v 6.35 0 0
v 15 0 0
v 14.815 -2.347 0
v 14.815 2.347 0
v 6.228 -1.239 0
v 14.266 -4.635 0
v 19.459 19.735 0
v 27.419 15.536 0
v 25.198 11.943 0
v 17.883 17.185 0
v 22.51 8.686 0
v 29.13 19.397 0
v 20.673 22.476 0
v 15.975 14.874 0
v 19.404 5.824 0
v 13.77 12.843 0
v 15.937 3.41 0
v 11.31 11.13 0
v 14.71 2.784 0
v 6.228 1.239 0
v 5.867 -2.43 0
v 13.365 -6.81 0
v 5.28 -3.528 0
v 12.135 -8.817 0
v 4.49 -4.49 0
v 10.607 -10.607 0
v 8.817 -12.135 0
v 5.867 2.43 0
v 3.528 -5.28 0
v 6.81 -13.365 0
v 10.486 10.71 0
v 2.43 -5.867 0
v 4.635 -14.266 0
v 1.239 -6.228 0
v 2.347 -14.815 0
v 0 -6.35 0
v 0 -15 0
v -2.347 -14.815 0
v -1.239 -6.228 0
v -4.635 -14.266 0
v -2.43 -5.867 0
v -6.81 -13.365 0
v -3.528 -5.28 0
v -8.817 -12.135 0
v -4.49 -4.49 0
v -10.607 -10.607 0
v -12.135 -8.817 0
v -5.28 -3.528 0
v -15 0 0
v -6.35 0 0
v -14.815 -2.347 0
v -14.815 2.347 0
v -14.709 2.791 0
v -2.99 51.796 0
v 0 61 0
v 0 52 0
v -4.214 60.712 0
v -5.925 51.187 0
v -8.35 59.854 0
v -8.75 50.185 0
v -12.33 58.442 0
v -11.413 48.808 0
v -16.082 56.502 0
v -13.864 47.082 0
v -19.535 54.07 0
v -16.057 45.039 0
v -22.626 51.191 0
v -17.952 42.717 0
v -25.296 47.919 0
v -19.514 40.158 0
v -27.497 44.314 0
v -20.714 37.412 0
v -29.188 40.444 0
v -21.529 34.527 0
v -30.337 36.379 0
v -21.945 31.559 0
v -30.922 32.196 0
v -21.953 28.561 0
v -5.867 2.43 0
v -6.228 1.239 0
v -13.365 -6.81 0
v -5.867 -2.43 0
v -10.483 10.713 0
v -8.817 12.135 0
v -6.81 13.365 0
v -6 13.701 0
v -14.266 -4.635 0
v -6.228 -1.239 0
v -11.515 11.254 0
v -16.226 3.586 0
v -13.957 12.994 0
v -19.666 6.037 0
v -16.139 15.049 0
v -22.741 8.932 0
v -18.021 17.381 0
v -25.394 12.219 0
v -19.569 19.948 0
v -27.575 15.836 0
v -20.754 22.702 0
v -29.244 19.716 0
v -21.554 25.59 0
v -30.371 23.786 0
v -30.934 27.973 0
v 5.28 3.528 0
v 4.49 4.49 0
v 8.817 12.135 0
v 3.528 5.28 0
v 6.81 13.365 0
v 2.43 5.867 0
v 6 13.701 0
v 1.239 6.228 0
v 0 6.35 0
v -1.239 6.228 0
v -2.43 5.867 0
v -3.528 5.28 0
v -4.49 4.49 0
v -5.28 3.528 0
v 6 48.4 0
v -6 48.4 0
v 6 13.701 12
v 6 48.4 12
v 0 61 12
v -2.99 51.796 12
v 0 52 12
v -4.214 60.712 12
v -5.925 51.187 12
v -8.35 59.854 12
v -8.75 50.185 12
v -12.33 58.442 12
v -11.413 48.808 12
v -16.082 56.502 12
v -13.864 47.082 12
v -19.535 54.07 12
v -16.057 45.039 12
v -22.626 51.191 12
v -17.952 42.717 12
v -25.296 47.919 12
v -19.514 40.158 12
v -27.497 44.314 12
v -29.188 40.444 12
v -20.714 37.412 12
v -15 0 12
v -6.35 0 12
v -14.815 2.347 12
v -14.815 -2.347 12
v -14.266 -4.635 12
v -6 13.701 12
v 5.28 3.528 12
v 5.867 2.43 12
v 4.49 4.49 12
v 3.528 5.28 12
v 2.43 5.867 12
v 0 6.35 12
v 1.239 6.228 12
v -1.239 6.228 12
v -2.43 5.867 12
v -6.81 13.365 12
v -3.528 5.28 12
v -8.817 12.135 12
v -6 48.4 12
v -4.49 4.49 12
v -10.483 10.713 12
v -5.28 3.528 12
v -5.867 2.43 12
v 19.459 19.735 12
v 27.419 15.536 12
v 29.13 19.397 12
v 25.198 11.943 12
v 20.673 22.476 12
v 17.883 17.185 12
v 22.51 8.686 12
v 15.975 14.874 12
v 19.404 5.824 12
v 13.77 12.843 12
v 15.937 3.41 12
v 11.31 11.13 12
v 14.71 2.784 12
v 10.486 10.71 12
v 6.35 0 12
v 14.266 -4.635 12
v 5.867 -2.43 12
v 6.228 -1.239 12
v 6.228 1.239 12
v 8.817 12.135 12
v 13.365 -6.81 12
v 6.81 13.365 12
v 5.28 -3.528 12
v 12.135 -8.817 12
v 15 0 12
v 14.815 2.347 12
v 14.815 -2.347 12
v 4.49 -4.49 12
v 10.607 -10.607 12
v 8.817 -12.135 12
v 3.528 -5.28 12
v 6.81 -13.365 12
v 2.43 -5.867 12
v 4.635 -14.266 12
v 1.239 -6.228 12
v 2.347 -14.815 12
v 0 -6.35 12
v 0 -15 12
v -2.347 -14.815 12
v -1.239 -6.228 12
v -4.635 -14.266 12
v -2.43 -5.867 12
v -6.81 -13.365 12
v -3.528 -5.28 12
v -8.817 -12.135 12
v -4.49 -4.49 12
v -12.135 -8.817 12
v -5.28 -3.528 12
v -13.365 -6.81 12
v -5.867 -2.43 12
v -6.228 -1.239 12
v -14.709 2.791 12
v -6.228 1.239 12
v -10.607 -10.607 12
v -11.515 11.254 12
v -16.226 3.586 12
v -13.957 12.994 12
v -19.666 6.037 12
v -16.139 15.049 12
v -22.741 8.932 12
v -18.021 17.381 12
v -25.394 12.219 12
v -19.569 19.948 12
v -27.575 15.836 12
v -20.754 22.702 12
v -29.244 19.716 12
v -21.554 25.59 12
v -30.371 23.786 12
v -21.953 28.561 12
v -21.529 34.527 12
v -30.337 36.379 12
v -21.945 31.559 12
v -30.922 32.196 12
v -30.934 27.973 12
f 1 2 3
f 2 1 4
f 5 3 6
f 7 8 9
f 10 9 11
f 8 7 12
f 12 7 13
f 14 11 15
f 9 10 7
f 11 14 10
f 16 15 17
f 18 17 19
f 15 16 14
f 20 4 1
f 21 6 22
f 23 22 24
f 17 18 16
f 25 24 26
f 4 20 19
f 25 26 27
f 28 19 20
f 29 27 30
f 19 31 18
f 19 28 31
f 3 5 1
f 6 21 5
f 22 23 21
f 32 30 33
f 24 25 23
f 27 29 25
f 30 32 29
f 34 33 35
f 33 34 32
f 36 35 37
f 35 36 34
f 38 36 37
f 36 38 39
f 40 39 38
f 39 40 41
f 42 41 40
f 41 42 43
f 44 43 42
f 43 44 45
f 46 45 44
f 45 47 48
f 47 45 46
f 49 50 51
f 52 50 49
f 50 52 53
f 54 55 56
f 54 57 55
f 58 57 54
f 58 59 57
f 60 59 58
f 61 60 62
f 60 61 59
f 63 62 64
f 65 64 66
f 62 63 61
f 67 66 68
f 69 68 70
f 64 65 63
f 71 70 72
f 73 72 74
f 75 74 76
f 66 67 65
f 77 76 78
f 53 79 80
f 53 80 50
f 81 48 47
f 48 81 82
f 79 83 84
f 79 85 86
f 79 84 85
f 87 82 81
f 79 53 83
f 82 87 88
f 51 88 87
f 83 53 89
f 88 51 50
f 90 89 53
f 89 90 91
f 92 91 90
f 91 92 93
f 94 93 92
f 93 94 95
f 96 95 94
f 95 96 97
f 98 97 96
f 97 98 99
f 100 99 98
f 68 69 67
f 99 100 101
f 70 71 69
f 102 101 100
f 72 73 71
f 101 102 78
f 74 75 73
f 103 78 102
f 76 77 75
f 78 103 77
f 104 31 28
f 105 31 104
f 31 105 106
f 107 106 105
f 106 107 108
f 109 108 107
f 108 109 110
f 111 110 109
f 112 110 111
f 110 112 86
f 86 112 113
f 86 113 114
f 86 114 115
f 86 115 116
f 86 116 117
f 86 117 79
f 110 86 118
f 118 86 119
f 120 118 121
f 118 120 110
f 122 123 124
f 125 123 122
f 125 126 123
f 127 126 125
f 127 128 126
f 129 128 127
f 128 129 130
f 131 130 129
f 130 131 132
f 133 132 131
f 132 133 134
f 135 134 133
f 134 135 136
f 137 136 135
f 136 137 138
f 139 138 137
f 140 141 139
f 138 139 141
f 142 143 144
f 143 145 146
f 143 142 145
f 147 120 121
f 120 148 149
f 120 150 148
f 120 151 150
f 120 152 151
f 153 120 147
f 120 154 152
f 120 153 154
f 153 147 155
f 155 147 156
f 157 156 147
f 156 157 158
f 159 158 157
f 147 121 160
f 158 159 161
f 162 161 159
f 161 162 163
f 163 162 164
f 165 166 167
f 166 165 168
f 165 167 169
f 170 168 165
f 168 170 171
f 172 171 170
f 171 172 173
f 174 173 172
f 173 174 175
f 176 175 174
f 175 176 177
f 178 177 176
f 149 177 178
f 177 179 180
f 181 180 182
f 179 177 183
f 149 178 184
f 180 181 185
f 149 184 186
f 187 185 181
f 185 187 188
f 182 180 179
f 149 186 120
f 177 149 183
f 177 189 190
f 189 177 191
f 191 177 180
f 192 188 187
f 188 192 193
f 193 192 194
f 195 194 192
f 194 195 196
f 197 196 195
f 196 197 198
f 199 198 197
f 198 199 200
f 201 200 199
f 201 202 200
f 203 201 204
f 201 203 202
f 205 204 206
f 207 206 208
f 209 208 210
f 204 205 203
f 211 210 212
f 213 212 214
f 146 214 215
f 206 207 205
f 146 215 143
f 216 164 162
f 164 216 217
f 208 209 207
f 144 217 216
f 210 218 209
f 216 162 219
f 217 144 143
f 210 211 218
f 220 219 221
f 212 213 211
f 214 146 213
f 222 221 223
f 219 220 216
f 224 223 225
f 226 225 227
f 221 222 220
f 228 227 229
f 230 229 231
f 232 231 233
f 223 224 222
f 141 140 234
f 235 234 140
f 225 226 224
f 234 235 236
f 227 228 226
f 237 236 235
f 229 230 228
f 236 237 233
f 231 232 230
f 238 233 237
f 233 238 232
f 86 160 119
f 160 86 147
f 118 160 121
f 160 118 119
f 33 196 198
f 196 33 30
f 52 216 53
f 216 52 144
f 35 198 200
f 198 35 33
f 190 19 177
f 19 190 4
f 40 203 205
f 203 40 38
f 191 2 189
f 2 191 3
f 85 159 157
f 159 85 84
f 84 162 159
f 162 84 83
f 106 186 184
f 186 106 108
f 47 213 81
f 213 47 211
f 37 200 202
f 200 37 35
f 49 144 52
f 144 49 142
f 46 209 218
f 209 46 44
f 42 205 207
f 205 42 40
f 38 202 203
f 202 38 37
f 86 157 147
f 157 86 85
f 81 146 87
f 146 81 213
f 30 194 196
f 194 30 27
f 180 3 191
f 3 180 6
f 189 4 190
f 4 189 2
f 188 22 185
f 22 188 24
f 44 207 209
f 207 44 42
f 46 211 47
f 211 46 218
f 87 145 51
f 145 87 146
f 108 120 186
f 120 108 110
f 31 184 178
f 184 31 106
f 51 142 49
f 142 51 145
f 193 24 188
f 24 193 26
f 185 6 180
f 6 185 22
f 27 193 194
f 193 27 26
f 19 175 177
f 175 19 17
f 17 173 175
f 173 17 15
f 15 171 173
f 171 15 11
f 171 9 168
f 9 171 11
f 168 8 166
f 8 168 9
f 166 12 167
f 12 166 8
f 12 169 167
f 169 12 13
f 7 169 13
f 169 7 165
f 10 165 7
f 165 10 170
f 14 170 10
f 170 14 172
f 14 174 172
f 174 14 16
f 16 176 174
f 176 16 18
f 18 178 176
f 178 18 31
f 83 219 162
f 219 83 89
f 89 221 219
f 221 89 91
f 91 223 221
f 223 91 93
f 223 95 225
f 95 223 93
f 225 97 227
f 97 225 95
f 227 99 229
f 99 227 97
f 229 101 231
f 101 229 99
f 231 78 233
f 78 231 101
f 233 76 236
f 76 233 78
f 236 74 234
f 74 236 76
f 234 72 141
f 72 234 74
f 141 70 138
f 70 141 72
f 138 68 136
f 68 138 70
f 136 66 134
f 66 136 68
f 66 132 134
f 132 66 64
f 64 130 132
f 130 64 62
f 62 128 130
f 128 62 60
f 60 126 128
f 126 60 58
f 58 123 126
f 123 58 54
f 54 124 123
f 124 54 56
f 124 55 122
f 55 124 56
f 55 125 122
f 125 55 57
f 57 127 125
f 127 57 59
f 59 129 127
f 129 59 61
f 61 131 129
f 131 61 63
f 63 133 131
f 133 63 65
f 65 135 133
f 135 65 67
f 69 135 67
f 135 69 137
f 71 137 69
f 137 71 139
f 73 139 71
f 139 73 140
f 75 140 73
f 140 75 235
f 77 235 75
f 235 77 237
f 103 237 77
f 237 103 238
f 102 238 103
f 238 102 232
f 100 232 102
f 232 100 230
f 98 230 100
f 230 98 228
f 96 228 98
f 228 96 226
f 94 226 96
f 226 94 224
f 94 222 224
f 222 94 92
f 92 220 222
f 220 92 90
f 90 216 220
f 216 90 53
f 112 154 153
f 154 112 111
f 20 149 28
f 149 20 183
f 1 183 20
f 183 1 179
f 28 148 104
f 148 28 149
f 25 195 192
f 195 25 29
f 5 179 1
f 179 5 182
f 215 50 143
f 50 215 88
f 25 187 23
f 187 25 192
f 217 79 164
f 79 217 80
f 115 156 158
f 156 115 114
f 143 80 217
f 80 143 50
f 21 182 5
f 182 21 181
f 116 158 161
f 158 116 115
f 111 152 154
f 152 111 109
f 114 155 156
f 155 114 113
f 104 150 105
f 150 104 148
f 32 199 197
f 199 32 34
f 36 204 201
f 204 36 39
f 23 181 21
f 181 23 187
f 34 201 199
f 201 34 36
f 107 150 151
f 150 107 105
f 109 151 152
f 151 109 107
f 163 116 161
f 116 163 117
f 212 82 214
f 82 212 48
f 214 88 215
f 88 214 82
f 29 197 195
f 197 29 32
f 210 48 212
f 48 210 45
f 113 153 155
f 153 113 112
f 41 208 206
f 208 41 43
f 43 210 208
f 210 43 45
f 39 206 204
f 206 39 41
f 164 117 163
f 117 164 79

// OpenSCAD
$fn = 32;

// ----------------------------------------------------------------------
// Hook: 60 mm shank into a 22 mm curl, 12 mm thick
// ----------------------------------------------------------------------

// --- parameters (mm) ---
shank_len = 60;           // shank length from the boss centre
shank_w = 12;             // shank width
boss_d = 30;              // boss diameter
bore_d = 12.7;            // boss bore
curl_in = 22;             // curl inner radius
curl_out = 31;            // curl outer radius
curl_sweep = 250;         // curl sweep angle
hook_t = 12;              // hook thickness

shank_profile = [[-6, 48.4], [6, 48.4], [6, 13], [-6, 13]];
boss_profile = [[15, 0], [14.815, 2.347], [14.266, 4.635], [13.365, 6.81], [12.135, 8.817], [10.607, 10.607], [8.817, 12.135], [6.81, 13.365], [4.635, 14.266], [2.347, 14.815], [0, 15], [-2.347, 14.815], [-4.635, 14.266], [-6.81, 13.365], [-8.817, 12.135], [-10.607, 10.607], [-12.135, 8.817], [-13.365, 6.81], [-14.266, 4.635], [-14.815, 2.347], [-15, 0], [-14.815, -2.347], [-14.266, -4.635], [-13.365, -6.81], [-12.135, -8.817], [-10.607, -10.607], [-8.817, -12.135], [-6.81, -13.365], [-4.635, -14.266], [-2.347, -14.815], [0, -15], [2.347, -14.815], [4.635, -14.266], [6.81, -13.365], [8.817, -12.135], [10.607, -10.607], [12.135, -8.817], [13.365, -6.81], [14.266, -4.635], [14.815, -2.347]];
curl_profile = [[0, 61], [-4.214, 60.712], [-8.35, 59.854], [-12.33, 58.442], [-16.082, 56.502], [-19.535, 54.07], [-22.626, 51.191], [-25.296, 47.919], [-27.497, 44.314], [-29.188, 40.444], [-30.337, 36.379], [-30.922, 32.196], [-30.934, 27.973], [-30.371, 23.786], [-29.244, 19.716], [-27.575, 15.836], [-25.394, 12.219], [-22.741, 8.932], [-19.666, 6.037], [-16.226, 3.586], [-12.485, 1.625], [-8.512, 0.192], [-4.381, -0.689], [-0.169, -1], [4.046, -0.735], [8.187, 0.101], [12.175, 1.491], [15.937, 3.41], [19.404, 5.824], [22.51, 8.686], [25.198, 11.943], [27.419, 15.536], [29.13, 19.397], [20.673, 22.476], [19.459, 19.735], [17.883, 17.185], [15.975, 14.874], [13.77, 12.843], [11.31, 11.13], [8.64, 9.768], [5.81, 8.781], [2.872, 8.188], [-0.12, 8], [-3.109, 8.221], [-6.041, 8.846], [-8.86, 9.863], [-11.515, 11.254], [-13.957, 12.994], [-16.139, 15.049], [-18.021, 17.381], [-19.569, 19.948], [-20.754, 22.702], [-21.554, 25.59], [-21.953, 28.561], [-21.945, 31.559], [-21.529, 34.527], [-20.714, 37.412], [-19.514, 40.158], [-17.952, 42.717], [-16.057, 45.039], [-13.864, 47.082], [-11.413, 48.808], [-8.75, 50.185], [-5.925, 51.187], [-2.99, 51.796], [0, 52]];

difference() {
  union() {
    /* three overlapping outlines: shank, boss and the smooth curl */
    linear_extrude(height = hook_t) polygon(shank_profile);
    linear_extrude(height = hook_t) polygon(boss_profile);
    linear_extrude(height = hook_t) polygon(curl_profile);
  }
  translate([0, 0, -2.5]) cylinder(h = hook_t + 5, d = bore_d);
}
